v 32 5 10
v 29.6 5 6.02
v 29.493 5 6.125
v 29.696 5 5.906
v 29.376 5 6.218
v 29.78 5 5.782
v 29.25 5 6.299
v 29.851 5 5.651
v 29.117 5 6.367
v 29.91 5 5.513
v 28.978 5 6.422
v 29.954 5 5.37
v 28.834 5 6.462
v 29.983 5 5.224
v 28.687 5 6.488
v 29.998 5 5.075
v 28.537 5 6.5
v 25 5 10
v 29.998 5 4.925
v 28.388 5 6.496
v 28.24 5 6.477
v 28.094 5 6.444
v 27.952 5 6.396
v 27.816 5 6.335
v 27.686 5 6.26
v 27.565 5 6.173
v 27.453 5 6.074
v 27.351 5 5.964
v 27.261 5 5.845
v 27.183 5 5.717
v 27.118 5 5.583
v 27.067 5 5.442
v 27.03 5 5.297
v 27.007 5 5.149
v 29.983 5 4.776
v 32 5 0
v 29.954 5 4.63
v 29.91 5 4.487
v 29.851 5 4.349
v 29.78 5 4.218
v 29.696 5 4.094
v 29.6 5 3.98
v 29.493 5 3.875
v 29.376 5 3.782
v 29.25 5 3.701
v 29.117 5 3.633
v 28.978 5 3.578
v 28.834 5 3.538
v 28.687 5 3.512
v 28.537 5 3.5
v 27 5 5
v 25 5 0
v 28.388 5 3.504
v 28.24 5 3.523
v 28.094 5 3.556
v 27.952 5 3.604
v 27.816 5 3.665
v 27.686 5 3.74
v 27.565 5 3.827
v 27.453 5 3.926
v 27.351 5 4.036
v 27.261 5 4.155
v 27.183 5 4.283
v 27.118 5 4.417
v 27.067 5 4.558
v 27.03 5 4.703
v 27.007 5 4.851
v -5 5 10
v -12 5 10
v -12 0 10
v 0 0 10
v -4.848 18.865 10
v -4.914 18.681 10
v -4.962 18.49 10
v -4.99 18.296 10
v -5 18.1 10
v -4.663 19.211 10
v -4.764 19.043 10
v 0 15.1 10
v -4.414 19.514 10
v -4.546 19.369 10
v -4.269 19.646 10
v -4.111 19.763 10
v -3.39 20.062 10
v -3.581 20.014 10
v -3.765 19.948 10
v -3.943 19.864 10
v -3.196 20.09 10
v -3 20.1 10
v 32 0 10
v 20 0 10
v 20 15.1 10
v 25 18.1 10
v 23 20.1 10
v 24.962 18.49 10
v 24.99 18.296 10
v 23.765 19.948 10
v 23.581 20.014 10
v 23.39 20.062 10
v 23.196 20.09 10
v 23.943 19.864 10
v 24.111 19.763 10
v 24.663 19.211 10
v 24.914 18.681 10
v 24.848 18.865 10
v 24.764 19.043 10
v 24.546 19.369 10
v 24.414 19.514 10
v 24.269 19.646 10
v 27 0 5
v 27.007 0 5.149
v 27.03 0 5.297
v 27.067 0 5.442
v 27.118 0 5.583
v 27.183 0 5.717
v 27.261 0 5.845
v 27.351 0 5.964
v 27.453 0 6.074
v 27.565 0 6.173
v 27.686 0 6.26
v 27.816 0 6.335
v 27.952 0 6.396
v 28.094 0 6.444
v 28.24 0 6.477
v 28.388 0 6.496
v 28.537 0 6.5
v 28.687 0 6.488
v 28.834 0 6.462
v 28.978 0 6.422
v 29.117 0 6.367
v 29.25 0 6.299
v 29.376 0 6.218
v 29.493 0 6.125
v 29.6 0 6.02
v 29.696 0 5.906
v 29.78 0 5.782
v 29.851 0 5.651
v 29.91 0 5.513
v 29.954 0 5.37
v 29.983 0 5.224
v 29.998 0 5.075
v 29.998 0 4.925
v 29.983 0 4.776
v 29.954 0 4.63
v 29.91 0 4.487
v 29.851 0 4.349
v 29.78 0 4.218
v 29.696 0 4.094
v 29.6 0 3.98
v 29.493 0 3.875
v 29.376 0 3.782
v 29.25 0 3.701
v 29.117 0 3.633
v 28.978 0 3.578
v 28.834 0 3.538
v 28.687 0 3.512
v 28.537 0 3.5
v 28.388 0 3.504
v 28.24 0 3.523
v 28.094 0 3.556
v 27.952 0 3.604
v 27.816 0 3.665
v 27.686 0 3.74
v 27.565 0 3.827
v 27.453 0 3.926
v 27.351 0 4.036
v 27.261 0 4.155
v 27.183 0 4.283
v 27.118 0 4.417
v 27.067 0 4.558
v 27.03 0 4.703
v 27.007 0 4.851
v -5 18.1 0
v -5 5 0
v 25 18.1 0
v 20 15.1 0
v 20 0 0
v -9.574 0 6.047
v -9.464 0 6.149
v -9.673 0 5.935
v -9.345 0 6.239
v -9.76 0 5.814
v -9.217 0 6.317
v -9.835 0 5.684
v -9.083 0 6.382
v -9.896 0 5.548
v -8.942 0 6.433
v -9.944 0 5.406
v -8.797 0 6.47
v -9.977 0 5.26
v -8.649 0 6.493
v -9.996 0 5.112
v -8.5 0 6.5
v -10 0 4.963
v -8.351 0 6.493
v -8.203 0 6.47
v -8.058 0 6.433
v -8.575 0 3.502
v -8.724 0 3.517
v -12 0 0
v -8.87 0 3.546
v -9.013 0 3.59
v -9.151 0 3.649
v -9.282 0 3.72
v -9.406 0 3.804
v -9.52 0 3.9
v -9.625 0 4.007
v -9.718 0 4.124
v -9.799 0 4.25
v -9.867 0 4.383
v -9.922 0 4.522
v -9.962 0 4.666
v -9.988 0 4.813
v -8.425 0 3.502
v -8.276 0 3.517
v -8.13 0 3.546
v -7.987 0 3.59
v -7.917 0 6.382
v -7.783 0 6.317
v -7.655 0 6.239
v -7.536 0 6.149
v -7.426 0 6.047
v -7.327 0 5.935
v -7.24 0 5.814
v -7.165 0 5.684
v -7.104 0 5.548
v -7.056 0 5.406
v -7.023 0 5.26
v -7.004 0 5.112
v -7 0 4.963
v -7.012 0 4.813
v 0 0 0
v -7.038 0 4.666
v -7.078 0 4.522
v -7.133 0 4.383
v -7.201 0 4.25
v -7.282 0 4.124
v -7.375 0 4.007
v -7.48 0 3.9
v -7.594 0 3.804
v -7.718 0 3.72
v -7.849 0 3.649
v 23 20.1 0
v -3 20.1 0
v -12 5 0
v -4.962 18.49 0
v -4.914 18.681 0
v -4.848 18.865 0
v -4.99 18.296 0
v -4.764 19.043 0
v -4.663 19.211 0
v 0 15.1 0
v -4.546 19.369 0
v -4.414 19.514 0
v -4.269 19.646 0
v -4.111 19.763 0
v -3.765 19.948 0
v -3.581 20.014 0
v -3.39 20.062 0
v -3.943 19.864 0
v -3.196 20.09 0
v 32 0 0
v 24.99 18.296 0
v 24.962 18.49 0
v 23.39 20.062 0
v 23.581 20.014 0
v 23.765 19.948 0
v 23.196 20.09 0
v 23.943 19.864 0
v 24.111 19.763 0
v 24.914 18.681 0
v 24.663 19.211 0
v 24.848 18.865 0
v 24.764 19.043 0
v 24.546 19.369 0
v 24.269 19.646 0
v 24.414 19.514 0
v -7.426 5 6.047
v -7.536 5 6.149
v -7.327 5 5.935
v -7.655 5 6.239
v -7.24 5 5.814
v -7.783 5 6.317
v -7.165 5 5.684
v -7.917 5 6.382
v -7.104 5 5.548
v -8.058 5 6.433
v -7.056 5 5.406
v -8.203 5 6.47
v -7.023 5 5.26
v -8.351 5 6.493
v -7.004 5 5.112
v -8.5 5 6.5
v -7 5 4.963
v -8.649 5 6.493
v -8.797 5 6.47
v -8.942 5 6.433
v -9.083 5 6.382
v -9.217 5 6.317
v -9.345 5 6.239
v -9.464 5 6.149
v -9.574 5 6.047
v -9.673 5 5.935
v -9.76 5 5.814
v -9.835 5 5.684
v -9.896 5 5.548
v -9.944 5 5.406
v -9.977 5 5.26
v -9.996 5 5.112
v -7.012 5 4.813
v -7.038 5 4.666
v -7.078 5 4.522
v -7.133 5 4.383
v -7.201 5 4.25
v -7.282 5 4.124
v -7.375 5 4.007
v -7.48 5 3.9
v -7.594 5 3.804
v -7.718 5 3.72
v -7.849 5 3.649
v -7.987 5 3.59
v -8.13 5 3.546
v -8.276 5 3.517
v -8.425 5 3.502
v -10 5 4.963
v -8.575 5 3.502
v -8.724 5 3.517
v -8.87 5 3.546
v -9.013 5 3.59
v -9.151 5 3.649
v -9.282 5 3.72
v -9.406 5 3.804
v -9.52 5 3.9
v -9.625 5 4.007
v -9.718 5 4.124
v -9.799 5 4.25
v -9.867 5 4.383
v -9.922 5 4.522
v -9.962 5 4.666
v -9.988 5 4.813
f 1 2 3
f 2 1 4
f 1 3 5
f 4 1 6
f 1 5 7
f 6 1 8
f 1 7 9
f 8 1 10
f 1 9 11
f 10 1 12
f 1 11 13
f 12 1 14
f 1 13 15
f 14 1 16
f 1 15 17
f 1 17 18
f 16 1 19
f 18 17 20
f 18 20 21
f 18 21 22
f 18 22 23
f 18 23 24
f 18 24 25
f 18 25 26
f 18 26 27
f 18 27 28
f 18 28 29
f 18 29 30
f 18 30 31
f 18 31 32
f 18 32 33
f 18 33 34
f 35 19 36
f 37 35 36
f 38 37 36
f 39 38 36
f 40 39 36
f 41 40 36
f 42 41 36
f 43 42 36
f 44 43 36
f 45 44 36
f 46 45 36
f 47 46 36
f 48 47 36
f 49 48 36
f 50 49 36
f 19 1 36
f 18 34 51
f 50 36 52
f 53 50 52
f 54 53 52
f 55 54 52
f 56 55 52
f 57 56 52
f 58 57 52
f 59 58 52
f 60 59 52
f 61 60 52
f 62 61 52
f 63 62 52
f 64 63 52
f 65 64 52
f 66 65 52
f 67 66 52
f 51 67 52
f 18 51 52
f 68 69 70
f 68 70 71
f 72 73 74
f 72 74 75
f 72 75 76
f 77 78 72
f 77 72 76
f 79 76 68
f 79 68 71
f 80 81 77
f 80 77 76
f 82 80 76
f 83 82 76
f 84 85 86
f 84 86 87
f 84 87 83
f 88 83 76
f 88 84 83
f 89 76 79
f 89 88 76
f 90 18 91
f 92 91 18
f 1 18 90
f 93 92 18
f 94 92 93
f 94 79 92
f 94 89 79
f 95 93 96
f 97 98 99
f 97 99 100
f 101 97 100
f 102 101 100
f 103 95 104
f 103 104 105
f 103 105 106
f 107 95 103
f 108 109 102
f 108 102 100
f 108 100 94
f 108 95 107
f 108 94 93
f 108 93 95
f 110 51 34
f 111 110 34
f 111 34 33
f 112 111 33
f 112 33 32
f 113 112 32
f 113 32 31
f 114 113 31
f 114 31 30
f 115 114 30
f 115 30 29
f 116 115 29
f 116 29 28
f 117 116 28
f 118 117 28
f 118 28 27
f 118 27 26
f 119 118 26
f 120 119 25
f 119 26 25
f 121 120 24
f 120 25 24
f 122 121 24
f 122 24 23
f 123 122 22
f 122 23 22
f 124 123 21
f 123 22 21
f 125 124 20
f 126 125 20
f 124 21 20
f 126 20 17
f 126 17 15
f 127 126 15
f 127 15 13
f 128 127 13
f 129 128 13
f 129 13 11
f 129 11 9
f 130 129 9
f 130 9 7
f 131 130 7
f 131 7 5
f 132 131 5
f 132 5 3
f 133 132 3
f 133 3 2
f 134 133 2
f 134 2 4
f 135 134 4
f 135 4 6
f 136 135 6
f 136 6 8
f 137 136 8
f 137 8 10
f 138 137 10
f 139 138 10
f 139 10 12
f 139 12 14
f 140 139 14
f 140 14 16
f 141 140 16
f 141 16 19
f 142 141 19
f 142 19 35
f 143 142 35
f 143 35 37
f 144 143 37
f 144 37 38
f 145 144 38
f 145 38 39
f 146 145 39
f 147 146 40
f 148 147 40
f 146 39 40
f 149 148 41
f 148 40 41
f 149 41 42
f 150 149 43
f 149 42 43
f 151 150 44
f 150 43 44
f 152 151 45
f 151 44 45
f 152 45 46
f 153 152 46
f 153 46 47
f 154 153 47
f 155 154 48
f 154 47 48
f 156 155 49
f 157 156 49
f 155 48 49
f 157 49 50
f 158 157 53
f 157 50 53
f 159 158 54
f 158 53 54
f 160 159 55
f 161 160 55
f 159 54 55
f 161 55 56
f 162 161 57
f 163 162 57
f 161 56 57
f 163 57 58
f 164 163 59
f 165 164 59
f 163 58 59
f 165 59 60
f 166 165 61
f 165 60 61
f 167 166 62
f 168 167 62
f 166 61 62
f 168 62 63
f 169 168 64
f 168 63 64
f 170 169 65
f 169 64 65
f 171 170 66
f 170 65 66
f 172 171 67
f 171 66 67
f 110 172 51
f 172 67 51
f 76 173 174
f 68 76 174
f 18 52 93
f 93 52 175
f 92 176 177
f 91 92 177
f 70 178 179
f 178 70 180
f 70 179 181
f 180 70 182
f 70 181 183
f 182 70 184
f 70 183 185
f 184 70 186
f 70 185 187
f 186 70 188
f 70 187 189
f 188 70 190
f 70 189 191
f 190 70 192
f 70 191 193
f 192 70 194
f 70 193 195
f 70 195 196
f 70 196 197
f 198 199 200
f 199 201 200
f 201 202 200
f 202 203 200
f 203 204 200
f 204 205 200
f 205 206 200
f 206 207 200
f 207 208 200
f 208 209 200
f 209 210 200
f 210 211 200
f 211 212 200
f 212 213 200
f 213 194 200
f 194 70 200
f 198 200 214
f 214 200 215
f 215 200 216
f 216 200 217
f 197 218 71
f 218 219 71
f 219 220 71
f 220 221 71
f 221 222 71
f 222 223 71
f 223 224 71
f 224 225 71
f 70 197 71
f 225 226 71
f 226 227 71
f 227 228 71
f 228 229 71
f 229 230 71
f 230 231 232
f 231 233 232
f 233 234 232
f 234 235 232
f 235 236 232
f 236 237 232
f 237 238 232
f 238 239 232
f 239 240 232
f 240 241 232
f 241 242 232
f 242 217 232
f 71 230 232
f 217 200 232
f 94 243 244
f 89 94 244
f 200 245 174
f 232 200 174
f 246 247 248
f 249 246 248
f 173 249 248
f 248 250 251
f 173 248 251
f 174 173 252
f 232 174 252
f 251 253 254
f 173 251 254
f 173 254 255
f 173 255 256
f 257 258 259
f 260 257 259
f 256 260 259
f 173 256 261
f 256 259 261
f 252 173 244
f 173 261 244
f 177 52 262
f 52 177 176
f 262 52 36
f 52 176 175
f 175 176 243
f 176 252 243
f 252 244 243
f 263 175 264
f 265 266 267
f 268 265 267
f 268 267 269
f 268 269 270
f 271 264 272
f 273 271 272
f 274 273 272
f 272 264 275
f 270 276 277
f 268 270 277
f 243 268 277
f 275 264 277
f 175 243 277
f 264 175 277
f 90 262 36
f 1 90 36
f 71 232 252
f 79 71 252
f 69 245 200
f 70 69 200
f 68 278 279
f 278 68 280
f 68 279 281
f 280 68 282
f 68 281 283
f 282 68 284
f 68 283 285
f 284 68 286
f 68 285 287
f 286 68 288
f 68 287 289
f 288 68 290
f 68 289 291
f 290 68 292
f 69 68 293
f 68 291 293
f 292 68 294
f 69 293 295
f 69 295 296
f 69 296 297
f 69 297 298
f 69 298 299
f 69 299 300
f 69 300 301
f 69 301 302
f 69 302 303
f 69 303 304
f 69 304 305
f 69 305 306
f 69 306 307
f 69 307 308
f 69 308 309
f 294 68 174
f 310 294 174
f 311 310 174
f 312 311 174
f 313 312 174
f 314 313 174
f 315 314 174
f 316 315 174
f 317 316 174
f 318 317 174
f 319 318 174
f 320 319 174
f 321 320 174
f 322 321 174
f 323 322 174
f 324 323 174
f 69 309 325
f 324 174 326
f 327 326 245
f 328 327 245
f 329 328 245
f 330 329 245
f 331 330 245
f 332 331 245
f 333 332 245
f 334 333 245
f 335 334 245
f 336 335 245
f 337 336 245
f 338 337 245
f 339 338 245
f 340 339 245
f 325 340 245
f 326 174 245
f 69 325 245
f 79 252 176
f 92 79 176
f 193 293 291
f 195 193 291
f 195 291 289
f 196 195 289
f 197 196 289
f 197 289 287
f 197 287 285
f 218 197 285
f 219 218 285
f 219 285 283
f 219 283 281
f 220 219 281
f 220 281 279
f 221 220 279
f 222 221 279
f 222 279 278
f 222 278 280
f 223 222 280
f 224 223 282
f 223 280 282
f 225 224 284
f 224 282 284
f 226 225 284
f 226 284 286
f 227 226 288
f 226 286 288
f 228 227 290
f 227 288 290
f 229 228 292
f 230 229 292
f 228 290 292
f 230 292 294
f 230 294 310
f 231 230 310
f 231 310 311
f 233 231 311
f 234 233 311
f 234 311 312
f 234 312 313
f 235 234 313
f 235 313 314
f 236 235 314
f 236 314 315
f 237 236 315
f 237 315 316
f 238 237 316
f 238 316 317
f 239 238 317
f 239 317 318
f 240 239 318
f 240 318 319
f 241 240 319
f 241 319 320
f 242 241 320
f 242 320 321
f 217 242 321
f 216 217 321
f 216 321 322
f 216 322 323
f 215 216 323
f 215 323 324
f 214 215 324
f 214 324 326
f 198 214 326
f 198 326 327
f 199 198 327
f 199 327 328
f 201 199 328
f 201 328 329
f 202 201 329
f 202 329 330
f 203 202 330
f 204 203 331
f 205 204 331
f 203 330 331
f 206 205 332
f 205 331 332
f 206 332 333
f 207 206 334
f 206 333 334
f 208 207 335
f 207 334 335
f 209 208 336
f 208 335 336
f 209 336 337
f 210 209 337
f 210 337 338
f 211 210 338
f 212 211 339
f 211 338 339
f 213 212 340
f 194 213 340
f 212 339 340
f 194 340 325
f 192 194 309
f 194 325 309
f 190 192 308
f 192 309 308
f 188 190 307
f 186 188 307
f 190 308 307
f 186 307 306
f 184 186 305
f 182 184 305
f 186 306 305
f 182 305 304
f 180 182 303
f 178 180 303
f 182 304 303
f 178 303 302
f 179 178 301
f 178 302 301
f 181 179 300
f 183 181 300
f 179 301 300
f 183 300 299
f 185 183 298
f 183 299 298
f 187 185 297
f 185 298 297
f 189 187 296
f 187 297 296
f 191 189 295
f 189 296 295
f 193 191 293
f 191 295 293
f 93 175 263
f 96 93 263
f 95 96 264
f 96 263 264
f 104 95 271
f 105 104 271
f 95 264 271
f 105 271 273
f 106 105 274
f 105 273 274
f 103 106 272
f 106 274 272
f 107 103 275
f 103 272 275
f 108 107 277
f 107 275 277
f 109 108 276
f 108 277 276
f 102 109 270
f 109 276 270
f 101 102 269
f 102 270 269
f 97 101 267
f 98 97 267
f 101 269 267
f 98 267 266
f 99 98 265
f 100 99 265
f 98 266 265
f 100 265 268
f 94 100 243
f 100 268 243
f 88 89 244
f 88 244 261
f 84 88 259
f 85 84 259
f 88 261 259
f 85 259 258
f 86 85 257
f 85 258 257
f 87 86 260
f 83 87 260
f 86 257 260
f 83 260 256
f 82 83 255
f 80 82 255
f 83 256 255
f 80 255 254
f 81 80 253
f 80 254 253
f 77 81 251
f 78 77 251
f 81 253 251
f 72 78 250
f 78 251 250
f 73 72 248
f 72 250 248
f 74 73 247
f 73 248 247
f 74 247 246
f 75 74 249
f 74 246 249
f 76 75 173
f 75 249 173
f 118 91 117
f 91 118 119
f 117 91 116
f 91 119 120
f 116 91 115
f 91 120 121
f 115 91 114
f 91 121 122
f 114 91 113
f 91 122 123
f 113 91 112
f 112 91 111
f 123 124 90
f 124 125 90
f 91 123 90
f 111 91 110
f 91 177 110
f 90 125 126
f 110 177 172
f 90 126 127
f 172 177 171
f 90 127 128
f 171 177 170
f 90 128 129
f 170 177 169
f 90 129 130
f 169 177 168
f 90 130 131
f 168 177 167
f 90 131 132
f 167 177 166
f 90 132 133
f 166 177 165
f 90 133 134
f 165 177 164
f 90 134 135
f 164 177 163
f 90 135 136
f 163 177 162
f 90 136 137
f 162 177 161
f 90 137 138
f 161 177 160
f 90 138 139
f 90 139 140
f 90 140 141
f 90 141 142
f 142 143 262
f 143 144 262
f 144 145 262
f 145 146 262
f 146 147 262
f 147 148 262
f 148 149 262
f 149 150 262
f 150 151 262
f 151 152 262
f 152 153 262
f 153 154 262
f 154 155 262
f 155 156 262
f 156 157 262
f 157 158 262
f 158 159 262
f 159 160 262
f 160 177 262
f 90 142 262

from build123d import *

# Parameters (mm, degrees)
BOSS_EXTRU_1_DEPTH      = 10
ESQUISSE2_R             = 1.5
ENL_V_MAT_EXTRU_1_DEPTH = 10


with BuildPart() as part:
    # Esquisse1 → Boss.-Extru.1 (new body)
    with BuildSketch(Plane.XY):
        with BuildLine():
            Line((0, 0), (0, 15.1))
            Line((0, 15.1), (20, 15.1))
            Line((20, 15.1), (20, 0))
            Line((20, 0), (32, 0))
            Line((32, 0), (32, 5))
            Line((32, 5), (25, 5))
            Line((25, 5), (25, 18.1))
            ThreePointArc((25, 18.1), (24.414213562, 19.514213562), (23, 20.1))
            Line((23, 20.1), (-3, 20.1))
            ThreePointArc((-3, 20.1), (-4.414213562, 19.514213562), (-5, 18.1))
            Line((-5, 18.1), (-5, 5))
            Line((-5, 5), (-12, 5))
            Line((-12, 5), (-12, 0))
            Line((-12, 0), (0, 0))
        make_face()
    extrude(amount=BOSS_EXTRU_1_DEPTH)

    # Esquisse2 → Enlèv. mat.-Extru.1 (cut)
    with BuildSketch(Plane(origin=(0, 5, 0), x_dir=(1, 0, 0), z_dir=(0, 1, 0))):
        with Locations(Location((-8.5, -5, 0), (0, 0, 270))):
            Circle(ESQUISSE2_R)
        with Locations(Location((28.5, -5, 0), (0, 0, 180))):
            Circle(ESQUISSE2_R)
    extrude(amount=-ENL_V_MAT_EXTRU_1_DEPTH, mode=Mode.SUBTRACT)


solid = part.part
